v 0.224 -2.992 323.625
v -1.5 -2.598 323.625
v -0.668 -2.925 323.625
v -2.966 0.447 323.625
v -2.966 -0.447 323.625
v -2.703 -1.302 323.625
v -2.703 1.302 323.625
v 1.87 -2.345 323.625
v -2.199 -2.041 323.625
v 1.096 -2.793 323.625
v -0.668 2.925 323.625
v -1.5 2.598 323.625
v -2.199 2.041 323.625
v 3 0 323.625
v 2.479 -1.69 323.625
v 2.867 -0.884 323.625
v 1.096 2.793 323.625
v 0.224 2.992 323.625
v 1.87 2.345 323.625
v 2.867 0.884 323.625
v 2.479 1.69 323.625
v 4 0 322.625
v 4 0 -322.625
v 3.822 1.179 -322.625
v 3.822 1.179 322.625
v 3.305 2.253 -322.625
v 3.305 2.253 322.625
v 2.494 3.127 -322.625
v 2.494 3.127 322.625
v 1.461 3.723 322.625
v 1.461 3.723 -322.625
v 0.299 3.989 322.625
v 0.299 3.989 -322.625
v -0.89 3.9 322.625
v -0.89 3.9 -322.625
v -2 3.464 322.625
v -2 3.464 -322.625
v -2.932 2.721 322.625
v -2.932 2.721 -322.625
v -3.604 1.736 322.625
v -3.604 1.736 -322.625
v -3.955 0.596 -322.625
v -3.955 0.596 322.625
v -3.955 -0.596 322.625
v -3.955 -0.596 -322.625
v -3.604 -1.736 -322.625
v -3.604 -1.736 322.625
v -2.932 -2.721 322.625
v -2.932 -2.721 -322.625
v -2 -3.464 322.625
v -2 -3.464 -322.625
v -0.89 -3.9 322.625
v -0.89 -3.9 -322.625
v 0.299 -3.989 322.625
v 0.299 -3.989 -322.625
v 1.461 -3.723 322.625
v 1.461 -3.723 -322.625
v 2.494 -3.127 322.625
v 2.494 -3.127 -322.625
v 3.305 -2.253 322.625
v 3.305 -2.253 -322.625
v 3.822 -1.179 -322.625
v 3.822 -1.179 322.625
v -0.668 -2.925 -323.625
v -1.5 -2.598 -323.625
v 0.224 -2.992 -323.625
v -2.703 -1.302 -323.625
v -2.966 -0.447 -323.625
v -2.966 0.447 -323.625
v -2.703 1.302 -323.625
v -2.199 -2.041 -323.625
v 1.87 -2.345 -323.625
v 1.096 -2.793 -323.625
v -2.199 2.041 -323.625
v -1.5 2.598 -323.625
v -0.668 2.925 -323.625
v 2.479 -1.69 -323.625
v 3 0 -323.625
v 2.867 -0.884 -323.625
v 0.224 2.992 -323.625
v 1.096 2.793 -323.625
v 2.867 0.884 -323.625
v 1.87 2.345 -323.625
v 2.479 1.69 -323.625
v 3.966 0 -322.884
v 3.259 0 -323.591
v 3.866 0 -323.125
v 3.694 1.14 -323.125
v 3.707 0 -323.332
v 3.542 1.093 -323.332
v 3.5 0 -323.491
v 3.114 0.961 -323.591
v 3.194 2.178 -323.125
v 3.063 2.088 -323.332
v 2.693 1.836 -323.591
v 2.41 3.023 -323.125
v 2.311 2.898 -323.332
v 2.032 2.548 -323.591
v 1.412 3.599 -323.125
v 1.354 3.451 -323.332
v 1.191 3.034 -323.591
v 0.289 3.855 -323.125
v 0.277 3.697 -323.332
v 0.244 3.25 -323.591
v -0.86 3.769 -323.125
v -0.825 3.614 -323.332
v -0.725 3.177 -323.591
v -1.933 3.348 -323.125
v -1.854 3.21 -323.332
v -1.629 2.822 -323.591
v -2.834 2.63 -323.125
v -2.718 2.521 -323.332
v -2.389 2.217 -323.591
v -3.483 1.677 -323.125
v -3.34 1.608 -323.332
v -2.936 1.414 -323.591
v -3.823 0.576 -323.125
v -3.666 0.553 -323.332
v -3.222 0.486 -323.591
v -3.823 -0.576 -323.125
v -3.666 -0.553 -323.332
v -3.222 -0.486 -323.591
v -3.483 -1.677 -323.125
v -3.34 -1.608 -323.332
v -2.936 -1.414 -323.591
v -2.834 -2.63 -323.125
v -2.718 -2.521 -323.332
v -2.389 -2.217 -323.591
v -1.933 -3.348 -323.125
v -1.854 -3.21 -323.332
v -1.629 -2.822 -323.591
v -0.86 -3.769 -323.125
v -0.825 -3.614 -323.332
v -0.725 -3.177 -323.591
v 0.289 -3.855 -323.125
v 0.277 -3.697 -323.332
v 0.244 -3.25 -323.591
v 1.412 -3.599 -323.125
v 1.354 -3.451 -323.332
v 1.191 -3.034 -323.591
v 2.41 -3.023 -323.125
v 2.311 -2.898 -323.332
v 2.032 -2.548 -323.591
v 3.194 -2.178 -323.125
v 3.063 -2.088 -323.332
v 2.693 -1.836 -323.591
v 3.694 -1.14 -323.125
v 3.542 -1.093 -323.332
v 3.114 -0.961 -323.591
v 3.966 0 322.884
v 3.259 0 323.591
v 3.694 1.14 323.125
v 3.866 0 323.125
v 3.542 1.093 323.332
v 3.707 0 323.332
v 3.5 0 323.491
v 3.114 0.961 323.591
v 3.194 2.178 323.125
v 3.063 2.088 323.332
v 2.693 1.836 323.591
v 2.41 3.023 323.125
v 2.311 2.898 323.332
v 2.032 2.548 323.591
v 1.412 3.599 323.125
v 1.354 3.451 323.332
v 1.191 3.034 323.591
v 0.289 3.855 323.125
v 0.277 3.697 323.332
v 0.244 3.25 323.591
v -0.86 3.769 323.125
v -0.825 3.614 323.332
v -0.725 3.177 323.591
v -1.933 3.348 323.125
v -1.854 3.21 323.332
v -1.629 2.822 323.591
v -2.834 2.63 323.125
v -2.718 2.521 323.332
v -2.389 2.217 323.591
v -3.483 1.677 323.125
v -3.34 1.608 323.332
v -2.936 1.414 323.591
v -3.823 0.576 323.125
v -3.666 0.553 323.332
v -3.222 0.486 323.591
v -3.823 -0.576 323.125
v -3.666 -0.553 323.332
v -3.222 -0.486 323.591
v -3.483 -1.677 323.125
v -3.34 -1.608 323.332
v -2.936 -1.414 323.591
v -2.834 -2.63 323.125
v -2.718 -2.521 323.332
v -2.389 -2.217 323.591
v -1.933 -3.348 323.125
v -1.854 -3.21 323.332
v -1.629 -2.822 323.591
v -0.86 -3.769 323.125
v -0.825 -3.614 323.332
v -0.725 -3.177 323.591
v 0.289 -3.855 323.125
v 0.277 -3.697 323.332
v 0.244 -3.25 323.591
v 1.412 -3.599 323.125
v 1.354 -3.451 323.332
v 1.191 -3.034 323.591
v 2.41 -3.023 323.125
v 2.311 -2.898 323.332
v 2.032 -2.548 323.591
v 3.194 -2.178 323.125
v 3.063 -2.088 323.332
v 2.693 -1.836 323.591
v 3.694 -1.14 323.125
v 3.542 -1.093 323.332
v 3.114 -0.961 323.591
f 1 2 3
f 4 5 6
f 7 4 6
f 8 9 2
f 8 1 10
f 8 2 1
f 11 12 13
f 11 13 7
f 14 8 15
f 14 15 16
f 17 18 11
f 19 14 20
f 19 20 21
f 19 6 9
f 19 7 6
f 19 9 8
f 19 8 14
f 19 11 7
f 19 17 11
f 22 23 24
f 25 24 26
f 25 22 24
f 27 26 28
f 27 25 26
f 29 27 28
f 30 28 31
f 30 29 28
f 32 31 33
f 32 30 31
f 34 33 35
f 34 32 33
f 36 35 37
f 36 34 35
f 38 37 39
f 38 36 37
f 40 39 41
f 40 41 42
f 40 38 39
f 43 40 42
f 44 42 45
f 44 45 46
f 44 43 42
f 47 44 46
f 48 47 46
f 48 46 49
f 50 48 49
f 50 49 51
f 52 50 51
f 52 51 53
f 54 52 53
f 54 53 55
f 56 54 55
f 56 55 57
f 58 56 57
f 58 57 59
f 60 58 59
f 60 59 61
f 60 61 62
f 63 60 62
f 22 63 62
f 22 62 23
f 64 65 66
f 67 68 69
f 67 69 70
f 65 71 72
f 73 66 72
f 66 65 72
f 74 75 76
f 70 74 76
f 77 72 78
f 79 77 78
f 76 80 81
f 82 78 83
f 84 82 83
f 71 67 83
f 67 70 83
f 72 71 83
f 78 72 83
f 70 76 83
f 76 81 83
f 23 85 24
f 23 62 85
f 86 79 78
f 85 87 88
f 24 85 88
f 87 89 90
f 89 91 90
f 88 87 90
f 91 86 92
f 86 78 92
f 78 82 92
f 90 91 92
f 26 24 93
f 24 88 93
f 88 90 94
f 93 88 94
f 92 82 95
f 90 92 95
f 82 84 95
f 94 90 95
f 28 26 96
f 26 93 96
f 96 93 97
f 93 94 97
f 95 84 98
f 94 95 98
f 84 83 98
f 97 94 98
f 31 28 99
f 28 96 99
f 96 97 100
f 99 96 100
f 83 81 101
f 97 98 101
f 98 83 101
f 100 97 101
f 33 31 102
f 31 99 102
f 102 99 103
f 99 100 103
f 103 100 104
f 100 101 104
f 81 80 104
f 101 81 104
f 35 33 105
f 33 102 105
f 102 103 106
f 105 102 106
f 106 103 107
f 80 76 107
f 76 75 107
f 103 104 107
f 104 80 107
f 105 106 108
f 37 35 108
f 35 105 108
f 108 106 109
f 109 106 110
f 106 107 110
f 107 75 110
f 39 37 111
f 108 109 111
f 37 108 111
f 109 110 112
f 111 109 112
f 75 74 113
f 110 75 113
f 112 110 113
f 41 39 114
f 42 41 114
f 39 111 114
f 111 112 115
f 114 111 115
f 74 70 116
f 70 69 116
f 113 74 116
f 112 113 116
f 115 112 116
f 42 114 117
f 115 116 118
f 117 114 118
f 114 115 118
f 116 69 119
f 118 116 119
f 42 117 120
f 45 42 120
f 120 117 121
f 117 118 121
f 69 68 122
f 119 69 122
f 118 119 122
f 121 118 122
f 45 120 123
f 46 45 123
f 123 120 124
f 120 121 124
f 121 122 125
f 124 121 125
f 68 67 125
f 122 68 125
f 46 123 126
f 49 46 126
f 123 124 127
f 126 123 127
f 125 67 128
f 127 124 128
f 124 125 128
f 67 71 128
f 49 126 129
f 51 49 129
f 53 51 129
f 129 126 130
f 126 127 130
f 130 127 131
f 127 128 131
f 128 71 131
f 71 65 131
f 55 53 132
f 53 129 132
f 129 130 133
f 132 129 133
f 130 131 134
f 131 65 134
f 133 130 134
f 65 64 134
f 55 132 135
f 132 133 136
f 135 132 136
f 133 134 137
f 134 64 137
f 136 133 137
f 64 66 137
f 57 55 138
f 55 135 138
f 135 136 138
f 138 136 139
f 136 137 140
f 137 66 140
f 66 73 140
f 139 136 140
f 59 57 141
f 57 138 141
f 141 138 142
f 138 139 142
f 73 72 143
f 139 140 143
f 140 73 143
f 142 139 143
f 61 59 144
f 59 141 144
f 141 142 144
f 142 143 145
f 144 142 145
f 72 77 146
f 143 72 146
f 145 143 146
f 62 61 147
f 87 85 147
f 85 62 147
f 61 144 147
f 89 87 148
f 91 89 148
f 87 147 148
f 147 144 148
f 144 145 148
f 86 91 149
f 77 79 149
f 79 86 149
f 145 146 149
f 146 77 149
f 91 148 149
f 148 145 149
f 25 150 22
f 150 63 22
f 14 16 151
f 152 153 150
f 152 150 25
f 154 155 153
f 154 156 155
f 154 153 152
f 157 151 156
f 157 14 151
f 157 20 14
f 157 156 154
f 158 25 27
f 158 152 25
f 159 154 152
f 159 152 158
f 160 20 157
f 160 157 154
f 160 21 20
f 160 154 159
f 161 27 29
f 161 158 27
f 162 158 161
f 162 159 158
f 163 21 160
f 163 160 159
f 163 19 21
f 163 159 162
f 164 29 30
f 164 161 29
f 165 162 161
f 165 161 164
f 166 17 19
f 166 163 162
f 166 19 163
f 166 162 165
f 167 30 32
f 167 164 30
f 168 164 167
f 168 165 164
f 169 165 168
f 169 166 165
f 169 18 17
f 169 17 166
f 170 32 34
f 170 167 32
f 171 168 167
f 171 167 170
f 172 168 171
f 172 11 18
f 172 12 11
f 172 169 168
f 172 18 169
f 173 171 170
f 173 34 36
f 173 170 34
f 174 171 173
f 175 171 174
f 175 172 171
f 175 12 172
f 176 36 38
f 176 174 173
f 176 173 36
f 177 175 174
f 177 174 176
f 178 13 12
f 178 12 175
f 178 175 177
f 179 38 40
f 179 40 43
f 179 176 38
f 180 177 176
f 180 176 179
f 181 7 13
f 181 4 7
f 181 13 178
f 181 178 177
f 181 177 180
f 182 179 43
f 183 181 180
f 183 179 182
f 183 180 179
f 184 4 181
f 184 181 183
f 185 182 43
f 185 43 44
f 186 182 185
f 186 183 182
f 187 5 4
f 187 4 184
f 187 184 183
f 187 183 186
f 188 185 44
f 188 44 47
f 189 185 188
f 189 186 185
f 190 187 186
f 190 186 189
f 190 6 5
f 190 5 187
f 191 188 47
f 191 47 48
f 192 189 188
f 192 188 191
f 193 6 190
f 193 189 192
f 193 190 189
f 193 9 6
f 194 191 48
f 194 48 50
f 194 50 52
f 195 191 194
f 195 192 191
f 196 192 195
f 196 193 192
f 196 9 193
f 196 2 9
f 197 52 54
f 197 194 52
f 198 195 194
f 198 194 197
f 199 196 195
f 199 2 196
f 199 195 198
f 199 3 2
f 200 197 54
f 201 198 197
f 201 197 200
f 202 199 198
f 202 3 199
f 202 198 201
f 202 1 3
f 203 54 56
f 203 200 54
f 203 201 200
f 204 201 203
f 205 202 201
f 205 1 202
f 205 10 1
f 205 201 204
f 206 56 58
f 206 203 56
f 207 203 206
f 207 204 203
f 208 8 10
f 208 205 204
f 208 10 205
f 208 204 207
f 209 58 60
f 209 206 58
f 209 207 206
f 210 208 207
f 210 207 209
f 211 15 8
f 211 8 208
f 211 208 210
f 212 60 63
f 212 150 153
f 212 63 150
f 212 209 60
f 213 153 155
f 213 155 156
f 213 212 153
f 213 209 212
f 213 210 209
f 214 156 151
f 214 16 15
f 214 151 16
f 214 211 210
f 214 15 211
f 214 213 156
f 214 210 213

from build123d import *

# Parameters (mm, degrees)
EXTRUDE2_DEPTH      = 323.625
EXTRUDE2_DEPTH_BACK = 323.625
SKETCH1_R           = 4
FILLET2_R           = 1
FILLET3_R           = 1


with BuildPart() as part:
    # Sketch1 → Extrude2 (new, two sides: drawn at the far end of the back side and taken through both)
    with BuildSketch(Plane.XY.offset(-EXTRUDE2_DEPTH_BACK)):
        Circle(SKETCH1_R)
    extrude(amount=EXTRUDE2_DEPTH + EXTRUDE2_DEPTH_BACK)

    # Fillet2
    fillet2_edges = [part.edges().sort_by_distance(p)[0] for p in [
        (-4, 0, -323.625),
    ]]
    fillet(fillet2_edges, radius=FILLET2_R)

    # Fillet3
    fillet3_edges = [part.edges().sort_by_distance(p)[0] for p in [
        (-4, 0, 323.625),
    ]]
    fillet(fillet3_edges, radius=FILLET3_R)


solid = part.part
